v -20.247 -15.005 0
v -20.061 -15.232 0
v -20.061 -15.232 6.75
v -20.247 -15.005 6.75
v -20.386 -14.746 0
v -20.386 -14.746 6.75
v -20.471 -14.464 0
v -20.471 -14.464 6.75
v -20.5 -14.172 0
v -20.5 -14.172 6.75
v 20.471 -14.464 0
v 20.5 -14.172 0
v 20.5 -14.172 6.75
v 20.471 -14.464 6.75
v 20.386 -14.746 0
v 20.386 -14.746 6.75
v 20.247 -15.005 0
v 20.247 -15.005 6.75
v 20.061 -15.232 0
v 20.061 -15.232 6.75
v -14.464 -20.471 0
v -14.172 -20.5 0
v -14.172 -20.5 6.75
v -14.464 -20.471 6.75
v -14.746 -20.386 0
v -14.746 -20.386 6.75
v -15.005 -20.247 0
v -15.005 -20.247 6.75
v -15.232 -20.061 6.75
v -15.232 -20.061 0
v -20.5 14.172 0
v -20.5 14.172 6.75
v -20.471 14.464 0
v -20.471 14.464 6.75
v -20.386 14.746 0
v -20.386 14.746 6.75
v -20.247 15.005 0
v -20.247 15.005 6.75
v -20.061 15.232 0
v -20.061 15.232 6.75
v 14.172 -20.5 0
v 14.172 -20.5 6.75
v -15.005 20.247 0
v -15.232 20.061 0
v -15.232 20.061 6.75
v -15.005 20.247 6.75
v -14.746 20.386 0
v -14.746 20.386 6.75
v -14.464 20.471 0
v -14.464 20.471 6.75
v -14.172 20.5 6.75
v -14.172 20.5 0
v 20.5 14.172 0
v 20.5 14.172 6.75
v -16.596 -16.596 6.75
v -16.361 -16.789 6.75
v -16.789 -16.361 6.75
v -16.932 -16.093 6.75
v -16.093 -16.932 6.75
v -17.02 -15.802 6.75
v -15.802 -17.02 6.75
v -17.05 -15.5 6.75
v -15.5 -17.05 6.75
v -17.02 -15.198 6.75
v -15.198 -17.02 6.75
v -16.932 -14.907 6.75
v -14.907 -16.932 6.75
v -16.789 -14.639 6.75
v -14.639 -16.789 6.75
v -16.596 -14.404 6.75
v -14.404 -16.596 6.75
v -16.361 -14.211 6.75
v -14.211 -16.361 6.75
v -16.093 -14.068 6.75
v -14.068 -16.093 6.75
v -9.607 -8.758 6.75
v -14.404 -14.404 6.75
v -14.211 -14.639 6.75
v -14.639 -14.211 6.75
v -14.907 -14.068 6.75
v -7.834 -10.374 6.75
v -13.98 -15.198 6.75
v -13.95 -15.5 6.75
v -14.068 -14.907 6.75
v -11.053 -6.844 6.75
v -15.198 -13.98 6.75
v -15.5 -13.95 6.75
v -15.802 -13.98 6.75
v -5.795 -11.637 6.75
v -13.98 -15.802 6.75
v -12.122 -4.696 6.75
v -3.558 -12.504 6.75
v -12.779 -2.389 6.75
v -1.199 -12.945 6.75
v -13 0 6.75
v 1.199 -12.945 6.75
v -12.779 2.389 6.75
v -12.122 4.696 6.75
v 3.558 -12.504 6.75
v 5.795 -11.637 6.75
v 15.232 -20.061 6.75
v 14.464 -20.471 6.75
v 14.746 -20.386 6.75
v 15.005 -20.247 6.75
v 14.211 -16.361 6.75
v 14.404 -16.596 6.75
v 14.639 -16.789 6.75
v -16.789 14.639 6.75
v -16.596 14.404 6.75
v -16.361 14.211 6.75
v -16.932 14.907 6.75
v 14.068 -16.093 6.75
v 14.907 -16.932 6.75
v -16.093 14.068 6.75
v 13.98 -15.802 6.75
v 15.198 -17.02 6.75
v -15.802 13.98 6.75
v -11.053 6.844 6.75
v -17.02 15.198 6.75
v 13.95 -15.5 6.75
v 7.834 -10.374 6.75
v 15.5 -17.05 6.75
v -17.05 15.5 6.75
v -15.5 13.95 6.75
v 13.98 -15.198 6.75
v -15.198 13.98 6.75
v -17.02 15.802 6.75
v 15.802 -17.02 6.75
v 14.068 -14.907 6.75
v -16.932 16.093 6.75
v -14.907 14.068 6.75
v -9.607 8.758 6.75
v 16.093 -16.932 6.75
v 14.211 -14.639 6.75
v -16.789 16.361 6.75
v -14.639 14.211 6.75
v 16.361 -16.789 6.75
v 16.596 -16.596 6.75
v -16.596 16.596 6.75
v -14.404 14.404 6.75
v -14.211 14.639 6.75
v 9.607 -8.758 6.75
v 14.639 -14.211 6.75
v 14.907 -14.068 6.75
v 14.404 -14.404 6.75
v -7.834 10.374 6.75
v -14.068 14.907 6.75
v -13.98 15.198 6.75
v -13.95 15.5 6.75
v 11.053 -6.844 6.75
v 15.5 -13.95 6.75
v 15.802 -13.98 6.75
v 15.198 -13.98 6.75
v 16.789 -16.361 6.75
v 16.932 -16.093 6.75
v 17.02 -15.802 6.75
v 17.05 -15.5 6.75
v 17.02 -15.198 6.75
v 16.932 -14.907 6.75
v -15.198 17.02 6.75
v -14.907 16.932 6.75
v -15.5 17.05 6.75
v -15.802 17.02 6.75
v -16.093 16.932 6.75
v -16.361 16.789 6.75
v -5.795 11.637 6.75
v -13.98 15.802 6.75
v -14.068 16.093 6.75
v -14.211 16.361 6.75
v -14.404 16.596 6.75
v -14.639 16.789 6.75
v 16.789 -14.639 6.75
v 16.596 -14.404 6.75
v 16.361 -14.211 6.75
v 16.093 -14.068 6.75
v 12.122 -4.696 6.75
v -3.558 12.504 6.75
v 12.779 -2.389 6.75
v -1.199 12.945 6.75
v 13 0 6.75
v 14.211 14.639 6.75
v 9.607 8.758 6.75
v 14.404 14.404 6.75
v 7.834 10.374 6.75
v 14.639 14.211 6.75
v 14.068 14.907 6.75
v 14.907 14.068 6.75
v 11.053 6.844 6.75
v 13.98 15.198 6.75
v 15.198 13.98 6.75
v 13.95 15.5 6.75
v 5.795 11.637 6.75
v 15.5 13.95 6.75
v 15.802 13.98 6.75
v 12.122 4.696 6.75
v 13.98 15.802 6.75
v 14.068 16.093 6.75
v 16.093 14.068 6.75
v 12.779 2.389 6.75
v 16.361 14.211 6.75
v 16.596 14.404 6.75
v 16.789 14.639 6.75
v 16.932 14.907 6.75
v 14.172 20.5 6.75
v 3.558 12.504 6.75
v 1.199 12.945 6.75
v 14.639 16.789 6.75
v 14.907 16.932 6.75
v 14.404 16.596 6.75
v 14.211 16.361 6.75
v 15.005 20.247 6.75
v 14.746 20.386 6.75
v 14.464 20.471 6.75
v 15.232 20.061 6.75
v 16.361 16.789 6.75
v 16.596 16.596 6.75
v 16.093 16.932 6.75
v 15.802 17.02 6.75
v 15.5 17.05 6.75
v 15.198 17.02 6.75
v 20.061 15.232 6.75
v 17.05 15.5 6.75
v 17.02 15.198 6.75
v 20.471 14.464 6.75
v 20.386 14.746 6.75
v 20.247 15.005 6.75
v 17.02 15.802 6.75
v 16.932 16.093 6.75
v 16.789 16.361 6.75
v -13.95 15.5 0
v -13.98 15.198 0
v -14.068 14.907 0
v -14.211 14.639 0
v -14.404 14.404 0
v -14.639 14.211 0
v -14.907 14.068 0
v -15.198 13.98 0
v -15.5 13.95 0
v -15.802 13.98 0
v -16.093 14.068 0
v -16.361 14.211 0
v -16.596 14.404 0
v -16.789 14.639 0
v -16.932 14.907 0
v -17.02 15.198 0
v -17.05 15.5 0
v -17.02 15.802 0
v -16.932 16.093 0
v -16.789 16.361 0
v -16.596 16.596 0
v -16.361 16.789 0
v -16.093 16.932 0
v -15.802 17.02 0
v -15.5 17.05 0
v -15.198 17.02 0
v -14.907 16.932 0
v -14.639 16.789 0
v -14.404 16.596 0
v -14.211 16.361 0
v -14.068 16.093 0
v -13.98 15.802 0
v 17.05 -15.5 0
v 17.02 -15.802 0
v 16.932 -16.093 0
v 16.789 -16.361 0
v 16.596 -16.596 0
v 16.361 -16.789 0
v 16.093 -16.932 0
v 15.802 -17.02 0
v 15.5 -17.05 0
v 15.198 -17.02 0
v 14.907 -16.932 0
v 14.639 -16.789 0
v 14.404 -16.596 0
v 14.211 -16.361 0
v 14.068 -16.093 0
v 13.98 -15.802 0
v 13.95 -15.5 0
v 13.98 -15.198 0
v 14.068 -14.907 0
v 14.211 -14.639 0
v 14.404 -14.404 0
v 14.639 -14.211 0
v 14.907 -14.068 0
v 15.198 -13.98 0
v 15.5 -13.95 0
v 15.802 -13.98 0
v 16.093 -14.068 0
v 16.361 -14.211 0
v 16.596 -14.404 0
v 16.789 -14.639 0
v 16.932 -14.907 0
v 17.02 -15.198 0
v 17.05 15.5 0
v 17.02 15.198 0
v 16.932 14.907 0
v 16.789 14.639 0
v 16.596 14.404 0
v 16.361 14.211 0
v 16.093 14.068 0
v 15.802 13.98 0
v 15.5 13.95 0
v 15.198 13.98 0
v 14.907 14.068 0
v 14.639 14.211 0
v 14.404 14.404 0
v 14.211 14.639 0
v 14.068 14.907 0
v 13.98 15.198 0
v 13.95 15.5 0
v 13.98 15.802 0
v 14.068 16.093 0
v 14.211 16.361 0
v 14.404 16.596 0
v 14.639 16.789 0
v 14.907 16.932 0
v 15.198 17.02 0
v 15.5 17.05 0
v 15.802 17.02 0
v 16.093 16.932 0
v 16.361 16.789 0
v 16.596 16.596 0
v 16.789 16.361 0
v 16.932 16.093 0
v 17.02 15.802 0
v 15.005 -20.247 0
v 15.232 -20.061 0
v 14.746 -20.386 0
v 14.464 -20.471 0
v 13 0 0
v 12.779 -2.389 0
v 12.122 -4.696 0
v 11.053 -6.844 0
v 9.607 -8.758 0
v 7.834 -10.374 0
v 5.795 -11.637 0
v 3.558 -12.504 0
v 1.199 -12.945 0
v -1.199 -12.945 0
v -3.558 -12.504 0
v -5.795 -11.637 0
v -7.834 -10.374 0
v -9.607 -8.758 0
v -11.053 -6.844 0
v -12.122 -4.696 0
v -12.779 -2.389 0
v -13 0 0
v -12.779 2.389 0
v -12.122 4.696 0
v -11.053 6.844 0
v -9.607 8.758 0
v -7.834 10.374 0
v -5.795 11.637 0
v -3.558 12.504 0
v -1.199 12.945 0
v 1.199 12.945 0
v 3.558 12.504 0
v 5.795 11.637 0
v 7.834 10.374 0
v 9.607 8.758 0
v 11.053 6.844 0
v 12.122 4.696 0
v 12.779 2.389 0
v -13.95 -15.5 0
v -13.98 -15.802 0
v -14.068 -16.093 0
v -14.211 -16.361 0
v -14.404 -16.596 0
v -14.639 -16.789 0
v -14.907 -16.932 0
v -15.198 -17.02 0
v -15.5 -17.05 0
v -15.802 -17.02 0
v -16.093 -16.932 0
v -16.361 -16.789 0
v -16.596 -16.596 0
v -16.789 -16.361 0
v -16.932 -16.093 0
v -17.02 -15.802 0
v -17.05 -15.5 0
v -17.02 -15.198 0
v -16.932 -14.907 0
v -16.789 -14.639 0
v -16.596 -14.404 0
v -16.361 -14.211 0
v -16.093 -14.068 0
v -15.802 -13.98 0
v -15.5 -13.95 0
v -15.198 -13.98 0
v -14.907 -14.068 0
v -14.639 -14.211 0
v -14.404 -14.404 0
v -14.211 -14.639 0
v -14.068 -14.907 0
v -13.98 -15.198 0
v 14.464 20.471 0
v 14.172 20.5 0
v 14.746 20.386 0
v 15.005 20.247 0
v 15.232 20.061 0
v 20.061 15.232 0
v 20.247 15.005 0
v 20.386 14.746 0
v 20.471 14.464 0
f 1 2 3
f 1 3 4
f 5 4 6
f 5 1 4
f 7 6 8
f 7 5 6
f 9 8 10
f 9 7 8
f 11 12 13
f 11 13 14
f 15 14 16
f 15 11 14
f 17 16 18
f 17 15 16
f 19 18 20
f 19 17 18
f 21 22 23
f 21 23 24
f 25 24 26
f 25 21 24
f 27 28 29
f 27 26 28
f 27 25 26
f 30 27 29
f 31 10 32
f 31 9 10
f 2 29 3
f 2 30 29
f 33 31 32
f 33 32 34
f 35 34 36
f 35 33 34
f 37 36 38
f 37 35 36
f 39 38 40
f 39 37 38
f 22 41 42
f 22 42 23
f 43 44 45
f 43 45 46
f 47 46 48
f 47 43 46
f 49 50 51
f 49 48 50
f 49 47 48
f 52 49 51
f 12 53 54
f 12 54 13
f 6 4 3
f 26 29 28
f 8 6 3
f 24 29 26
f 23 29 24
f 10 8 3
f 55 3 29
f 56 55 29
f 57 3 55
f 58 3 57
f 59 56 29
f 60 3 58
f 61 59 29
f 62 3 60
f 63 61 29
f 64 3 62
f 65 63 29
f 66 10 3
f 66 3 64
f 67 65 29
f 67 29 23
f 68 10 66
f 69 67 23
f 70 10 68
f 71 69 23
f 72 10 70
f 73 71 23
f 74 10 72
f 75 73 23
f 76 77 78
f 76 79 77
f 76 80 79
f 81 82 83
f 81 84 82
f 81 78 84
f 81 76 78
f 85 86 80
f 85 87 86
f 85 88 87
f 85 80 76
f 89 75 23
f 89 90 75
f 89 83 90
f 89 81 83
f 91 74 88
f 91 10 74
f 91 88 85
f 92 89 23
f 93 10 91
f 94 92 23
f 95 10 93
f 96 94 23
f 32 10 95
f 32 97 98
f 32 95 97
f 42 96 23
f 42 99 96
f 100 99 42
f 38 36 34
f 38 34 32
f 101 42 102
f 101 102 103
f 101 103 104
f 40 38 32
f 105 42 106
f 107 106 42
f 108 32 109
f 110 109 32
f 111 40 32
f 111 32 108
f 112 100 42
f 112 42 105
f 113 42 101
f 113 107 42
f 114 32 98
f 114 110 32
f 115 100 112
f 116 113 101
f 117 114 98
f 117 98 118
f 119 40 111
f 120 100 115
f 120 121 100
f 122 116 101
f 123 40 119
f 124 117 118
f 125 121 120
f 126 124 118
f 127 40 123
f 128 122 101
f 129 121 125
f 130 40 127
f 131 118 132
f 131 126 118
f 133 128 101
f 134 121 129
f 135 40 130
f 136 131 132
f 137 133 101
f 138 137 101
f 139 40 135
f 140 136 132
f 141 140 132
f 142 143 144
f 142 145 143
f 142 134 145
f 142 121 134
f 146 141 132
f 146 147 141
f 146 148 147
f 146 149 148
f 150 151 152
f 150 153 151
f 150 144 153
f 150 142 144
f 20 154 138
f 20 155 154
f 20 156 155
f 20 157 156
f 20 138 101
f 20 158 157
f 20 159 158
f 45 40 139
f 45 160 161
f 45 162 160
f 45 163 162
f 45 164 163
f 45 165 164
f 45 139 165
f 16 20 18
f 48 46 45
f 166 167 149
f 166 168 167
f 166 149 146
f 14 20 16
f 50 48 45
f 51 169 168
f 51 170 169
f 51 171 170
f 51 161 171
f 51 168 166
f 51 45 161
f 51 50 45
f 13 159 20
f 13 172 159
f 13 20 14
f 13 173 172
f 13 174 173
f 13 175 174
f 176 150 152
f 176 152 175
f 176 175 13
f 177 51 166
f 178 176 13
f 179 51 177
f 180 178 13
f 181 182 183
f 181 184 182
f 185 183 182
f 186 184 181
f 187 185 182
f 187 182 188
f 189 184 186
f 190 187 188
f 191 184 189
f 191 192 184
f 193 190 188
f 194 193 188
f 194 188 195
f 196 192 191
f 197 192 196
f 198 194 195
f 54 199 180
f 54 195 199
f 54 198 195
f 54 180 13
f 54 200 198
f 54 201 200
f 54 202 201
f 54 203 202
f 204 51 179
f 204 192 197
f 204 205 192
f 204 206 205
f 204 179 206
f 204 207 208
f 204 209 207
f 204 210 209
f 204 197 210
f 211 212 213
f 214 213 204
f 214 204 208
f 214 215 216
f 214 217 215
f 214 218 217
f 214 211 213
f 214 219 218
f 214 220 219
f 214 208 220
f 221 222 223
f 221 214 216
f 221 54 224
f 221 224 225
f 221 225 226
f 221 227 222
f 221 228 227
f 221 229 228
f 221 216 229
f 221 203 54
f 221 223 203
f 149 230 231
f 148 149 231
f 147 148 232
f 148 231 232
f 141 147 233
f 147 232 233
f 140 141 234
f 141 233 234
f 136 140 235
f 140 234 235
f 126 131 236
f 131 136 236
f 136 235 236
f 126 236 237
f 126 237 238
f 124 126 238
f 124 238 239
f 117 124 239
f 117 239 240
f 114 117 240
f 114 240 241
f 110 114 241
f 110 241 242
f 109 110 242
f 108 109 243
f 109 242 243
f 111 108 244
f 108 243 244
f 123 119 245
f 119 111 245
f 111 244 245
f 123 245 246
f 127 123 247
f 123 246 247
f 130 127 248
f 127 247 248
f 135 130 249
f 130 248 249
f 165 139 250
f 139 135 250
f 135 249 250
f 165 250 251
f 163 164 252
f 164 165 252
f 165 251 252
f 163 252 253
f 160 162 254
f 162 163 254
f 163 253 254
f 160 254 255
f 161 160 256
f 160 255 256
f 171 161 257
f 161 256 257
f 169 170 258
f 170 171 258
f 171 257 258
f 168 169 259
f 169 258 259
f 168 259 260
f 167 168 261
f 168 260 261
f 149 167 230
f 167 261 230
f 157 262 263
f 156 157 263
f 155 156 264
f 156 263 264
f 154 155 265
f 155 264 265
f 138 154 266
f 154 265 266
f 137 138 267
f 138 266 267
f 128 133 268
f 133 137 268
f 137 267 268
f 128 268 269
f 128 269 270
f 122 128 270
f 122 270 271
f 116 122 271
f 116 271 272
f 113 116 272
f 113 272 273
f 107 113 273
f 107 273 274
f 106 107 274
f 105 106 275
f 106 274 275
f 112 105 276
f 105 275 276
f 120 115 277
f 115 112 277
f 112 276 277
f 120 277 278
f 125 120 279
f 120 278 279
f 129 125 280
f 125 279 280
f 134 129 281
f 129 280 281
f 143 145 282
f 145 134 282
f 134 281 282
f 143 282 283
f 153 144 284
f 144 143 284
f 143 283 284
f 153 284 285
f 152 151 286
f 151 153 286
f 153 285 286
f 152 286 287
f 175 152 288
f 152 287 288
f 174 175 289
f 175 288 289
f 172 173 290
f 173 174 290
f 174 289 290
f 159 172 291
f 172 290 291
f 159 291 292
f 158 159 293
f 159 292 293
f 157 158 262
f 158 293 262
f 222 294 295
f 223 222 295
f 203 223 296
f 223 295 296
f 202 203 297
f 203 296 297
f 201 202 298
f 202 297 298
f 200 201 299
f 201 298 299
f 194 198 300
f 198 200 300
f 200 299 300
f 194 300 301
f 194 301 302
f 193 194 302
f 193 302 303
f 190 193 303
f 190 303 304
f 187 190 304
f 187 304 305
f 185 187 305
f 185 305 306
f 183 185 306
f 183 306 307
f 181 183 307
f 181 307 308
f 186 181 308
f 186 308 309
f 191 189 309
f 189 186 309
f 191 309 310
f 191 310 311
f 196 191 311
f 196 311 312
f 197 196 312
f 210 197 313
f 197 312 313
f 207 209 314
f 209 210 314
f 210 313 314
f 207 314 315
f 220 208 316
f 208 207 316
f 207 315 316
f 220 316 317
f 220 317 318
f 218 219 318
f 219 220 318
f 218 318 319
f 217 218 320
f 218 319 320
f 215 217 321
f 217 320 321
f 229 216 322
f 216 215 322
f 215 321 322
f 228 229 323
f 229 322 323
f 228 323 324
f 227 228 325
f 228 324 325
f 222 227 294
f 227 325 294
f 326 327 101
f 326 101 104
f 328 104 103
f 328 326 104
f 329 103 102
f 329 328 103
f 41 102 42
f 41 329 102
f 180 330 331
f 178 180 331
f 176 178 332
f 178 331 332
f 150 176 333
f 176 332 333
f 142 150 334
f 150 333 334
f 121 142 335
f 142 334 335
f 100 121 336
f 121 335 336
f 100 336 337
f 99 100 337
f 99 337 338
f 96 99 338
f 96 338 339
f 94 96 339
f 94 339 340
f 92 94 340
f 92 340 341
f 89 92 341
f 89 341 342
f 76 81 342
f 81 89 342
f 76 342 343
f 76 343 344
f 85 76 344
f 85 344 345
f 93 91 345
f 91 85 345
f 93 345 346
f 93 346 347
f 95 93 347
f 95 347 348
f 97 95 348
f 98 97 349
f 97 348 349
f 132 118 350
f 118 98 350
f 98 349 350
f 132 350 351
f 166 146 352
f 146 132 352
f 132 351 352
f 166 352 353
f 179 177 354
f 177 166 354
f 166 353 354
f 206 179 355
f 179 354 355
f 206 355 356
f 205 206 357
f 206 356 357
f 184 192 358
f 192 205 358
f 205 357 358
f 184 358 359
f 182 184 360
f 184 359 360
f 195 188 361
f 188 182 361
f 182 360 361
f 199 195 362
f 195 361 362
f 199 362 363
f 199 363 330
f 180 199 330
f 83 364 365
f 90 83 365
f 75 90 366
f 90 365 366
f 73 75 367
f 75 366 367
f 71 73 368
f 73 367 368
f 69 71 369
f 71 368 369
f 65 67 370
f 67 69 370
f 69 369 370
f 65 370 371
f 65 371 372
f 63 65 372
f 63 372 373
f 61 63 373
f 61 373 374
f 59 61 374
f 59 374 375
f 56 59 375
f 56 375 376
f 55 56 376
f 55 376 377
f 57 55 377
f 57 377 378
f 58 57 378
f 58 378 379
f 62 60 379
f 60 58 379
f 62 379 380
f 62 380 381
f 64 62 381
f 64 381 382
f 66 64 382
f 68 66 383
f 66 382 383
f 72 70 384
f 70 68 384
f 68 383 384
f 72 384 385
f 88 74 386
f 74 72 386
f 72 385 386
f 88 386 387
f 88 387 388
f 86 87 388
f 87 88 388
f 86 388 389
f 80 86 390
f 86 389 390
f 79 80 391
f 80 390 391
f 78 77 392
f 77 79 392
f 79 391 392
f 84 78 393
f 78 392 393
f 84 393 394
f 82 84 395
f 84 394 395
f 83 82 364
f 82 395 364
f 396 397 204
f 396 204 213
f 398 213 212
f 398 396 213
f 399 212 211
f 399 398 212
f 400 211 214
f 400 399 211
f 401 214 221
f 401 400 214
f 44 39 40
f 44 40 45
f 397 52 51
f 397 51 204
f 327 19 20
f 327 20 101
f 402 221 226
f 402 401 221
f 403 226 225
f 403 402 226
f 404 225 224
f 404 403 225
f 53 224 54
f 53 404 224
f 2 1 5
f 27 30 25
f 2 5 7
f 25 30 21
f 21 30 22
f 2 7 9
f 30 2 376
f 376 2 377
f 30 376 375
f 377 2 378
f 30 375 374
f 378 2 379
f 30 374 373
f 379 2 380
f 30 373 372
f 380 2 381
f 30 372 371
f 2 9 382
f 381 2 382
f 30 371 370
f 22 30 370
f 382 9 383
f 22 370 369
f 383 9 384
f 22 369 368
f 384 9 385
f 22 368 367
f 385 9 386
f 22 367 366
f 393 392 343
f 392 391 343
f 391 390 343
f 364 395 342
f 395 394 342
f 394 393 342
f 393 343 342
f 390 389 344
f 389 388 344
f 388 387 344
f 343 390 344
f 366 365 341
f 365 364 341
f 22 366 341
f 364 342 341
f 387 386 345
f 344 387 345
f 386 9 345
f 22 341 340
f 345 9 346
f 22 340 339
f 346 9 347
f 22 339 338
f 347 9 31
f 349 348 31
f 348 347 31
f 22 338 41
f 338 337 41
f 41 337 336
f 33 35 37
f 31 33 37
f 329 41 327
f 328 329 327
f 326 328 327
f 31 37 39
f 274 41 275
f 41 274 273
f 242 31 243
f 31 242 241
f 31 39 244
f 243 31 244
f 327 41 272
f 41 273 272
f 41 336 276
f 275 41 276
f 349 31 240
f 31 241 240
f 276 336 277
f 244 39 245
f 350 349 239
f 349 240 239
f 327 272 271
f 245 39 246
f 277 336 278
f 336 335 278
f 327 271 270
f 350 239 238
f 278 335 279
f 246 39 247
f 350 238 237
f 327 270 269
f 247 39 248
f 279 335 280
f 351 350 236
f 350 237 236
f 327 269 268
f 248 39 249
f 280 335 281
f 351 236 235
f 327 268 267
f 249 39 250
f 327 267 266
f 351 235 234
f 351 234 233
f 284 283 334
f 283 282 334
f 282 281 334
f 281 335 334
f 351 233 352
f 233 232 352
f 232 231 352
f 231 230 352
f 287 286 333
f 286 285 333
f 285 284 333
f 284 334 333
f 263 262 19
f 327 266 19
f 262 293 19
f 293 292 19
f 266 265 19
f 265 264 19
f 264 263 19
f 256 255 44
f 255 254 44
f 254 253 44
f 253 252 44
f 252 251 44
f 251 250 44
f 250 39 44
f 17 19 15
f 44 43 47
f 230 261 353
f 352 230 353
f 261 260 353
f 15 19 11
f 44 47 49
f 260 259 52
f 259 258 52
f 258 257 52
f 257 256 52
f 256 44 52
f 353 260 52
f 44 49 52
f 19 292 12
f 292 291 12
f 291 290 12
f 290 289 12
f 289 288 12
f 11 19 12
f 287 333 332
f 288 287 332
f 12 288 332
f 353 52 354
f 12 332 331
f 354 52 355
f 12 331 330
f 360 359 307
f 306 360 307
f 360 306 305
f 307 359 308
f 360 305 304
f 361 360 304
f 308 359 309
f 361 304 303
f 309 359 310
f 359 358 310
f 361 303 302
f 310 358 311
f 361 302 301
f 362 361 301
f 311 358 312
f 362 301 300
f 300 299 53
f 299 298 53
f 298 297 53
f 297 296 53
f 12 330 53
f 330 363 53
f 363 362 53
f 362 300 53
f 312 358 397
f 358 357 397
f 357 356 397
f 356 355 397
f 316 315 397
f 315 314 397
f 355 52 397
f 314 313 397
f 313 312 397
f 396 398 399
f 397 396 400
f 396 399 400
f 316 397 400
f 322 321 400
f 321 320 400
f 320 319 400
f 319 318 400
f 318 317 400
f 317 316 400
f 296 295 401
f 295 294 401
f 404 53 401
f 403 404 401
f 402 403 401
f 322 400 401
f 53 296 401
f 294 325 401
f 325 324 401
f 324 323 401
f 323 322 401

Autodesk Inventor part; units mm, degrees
ref_plane "YZ Plane" through (0, 0, 0) normal (1, 0, 0) x (0, 1, 0)
ref_plane "XZ Plane" through (0, 0, 0) normal (0, 1, 0) x (-1, 0, 0)
ref_plane "Work Plane3" through (0, 0, 0) normal (0, 0, 1) x (1, 0, 0)
sketch "Sketch1" plane through (0, 0, 0) normal (0, 0, 1) x (1, 0, 0)
  circle A0 centre (15.5, -15.5) radius 1.25 projected
  circle A1 centre (-15.5, -15.5) radius 1.25 projected
  circle A2 centre (15.5, 15.5) radius 1.25 projected
  circle A3 centre (-15.5, 15.5) radius 1.25 projected
  circle A4 centre (0, 0) radius 11 projected
  line L0 (-14.1716, 20.5) -> (14.1716, 20.5) projected
  arc A5 (-14.1716, 20.5) -> (-15.2322, 20.0607) centre (-14.1716, 19) ccw projected
  line L1 (-20.0607, 15.2322) -> (-15.2322, 20.0607) projected
  arc A6 (-20.0607, 15.2322) -> (-20.5, 14.1716) centre (-19, 14.1716) ccw projected
  line L2 (-20.5, -14.1716) -> (-20.5, 14.1716) projected
  arc A7 (-20.5, -14.1716) -> (-20.0607, -15.2322) centre (-19, -14.1716) ccw projected
  line L3 (-15.2322, -20.0607) -> (-20.0607, -15.2322) projected
  arc A8 (-15.2322, -20.0607) -> (-14.1716, -20.5) centre (-14.1716, -19) ccw projected
  line L4 (14.1716, -20.5) -> (-14.1716, -20.5) projected
  arc A9 (14.1716, -20.5) -> (15.2322, -20.0607) centre (14.1716, -19) ccw projected
  line L5 (20.0607, -15.2322) -> (15.2322, -20.0607) projected
  arc A10 (20.0607, -15.2322) -> (20.5, -14.1716) centre (19, -14.1716) ccw projected
  line L6 (20.5, 14.1716) -> (20.5, -14.1716) projected
  arc A11 (20.5, 14.1716) -> (20.0607, 15.2322) centre (19, 14.1716) ccw projected
  line L7 (15.2322, 20.0607) -> (20.0607, 15.2322) projected
  arc A12 (15.2322, 20.0607) -> (14.1716, 20.5) centre (14.1716, 19) ccw projected
  circle A13 centre (0, 0) radius 13
  circle A14 centre (-15.5, -15.5) radius 1.55
  circle A15 centre (-15.5, 15.5) radius 1.55
  circle A16 centre (15.5, 15.5) radius 1.55
  circle A17 centre (15.5, -15.5) radius 1.55
  point P0 (0, 0)
  dimension "d0" = 2
  dimension "d7" = 3.1
extrude "Extrusion1" add sketch "Sketch1" along normal blind 6.75 contours L0 A12 L7 A11 L6 A10 L5 A9 L4 A8 L3 A7 L2 A6 L1 A5
properties part number "upvulling steppers axis5_6" material "ABS Plastic"
